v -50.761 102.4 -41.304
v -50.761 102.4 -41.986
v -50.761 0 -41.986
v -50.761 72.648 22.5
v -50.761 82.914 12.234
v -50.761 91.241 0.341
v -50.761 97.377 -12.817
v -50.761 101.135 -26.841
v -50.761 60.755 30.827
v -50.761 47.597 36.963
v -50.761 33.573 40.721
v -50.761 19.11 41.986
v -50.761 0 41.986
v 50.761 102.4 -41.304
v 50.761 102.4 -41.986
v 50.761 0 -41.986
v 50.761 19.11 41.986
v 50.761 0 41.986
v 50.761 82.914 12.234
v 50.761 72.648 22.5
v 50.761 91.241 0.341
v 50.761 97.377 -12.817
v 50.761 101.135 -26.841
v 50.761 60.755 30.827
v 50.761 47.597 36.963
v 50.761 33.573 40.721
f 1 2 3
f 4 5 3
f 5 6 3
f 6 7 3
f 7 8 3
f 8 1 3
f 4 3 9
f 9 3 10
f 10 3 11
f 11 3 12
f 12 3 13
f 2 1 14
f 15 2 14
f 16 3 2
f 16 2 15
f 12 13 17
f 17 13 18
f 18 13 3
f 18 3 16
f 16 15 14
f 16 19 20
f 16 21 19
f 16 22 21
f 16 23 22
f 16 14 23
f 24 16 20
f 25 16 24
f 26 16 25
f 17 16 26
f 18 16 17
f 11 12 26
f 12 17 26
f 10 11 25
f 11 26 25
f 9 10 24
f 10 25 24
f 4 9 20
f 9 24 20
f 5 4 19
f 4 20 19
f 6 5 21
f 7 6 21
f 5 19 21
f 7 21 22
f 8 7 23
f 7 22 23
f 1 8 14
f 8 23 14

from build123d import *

# Parameters (mm, degrees)
F0_W     = 101.522006
F0_H     = 83.972574
F1_DEPTH = 102.4
F2_R     = 83.290368


with BuildPart() as f1:
    # F0 (on Front) → F1 (new body)
    with BuildSketch(Plane.XZ):
        Rectangle(F0_W, F0_H)
    extrude(amount=-F1_DEPTH)

    # F2
    f2_edges = [f1.edges().sort_by_distance(p)[0] for p in [
        (0, 102.4, 41.986287),
    ]]
    fillet(f2_edges, radius=F2_R)


solid = f1.part
